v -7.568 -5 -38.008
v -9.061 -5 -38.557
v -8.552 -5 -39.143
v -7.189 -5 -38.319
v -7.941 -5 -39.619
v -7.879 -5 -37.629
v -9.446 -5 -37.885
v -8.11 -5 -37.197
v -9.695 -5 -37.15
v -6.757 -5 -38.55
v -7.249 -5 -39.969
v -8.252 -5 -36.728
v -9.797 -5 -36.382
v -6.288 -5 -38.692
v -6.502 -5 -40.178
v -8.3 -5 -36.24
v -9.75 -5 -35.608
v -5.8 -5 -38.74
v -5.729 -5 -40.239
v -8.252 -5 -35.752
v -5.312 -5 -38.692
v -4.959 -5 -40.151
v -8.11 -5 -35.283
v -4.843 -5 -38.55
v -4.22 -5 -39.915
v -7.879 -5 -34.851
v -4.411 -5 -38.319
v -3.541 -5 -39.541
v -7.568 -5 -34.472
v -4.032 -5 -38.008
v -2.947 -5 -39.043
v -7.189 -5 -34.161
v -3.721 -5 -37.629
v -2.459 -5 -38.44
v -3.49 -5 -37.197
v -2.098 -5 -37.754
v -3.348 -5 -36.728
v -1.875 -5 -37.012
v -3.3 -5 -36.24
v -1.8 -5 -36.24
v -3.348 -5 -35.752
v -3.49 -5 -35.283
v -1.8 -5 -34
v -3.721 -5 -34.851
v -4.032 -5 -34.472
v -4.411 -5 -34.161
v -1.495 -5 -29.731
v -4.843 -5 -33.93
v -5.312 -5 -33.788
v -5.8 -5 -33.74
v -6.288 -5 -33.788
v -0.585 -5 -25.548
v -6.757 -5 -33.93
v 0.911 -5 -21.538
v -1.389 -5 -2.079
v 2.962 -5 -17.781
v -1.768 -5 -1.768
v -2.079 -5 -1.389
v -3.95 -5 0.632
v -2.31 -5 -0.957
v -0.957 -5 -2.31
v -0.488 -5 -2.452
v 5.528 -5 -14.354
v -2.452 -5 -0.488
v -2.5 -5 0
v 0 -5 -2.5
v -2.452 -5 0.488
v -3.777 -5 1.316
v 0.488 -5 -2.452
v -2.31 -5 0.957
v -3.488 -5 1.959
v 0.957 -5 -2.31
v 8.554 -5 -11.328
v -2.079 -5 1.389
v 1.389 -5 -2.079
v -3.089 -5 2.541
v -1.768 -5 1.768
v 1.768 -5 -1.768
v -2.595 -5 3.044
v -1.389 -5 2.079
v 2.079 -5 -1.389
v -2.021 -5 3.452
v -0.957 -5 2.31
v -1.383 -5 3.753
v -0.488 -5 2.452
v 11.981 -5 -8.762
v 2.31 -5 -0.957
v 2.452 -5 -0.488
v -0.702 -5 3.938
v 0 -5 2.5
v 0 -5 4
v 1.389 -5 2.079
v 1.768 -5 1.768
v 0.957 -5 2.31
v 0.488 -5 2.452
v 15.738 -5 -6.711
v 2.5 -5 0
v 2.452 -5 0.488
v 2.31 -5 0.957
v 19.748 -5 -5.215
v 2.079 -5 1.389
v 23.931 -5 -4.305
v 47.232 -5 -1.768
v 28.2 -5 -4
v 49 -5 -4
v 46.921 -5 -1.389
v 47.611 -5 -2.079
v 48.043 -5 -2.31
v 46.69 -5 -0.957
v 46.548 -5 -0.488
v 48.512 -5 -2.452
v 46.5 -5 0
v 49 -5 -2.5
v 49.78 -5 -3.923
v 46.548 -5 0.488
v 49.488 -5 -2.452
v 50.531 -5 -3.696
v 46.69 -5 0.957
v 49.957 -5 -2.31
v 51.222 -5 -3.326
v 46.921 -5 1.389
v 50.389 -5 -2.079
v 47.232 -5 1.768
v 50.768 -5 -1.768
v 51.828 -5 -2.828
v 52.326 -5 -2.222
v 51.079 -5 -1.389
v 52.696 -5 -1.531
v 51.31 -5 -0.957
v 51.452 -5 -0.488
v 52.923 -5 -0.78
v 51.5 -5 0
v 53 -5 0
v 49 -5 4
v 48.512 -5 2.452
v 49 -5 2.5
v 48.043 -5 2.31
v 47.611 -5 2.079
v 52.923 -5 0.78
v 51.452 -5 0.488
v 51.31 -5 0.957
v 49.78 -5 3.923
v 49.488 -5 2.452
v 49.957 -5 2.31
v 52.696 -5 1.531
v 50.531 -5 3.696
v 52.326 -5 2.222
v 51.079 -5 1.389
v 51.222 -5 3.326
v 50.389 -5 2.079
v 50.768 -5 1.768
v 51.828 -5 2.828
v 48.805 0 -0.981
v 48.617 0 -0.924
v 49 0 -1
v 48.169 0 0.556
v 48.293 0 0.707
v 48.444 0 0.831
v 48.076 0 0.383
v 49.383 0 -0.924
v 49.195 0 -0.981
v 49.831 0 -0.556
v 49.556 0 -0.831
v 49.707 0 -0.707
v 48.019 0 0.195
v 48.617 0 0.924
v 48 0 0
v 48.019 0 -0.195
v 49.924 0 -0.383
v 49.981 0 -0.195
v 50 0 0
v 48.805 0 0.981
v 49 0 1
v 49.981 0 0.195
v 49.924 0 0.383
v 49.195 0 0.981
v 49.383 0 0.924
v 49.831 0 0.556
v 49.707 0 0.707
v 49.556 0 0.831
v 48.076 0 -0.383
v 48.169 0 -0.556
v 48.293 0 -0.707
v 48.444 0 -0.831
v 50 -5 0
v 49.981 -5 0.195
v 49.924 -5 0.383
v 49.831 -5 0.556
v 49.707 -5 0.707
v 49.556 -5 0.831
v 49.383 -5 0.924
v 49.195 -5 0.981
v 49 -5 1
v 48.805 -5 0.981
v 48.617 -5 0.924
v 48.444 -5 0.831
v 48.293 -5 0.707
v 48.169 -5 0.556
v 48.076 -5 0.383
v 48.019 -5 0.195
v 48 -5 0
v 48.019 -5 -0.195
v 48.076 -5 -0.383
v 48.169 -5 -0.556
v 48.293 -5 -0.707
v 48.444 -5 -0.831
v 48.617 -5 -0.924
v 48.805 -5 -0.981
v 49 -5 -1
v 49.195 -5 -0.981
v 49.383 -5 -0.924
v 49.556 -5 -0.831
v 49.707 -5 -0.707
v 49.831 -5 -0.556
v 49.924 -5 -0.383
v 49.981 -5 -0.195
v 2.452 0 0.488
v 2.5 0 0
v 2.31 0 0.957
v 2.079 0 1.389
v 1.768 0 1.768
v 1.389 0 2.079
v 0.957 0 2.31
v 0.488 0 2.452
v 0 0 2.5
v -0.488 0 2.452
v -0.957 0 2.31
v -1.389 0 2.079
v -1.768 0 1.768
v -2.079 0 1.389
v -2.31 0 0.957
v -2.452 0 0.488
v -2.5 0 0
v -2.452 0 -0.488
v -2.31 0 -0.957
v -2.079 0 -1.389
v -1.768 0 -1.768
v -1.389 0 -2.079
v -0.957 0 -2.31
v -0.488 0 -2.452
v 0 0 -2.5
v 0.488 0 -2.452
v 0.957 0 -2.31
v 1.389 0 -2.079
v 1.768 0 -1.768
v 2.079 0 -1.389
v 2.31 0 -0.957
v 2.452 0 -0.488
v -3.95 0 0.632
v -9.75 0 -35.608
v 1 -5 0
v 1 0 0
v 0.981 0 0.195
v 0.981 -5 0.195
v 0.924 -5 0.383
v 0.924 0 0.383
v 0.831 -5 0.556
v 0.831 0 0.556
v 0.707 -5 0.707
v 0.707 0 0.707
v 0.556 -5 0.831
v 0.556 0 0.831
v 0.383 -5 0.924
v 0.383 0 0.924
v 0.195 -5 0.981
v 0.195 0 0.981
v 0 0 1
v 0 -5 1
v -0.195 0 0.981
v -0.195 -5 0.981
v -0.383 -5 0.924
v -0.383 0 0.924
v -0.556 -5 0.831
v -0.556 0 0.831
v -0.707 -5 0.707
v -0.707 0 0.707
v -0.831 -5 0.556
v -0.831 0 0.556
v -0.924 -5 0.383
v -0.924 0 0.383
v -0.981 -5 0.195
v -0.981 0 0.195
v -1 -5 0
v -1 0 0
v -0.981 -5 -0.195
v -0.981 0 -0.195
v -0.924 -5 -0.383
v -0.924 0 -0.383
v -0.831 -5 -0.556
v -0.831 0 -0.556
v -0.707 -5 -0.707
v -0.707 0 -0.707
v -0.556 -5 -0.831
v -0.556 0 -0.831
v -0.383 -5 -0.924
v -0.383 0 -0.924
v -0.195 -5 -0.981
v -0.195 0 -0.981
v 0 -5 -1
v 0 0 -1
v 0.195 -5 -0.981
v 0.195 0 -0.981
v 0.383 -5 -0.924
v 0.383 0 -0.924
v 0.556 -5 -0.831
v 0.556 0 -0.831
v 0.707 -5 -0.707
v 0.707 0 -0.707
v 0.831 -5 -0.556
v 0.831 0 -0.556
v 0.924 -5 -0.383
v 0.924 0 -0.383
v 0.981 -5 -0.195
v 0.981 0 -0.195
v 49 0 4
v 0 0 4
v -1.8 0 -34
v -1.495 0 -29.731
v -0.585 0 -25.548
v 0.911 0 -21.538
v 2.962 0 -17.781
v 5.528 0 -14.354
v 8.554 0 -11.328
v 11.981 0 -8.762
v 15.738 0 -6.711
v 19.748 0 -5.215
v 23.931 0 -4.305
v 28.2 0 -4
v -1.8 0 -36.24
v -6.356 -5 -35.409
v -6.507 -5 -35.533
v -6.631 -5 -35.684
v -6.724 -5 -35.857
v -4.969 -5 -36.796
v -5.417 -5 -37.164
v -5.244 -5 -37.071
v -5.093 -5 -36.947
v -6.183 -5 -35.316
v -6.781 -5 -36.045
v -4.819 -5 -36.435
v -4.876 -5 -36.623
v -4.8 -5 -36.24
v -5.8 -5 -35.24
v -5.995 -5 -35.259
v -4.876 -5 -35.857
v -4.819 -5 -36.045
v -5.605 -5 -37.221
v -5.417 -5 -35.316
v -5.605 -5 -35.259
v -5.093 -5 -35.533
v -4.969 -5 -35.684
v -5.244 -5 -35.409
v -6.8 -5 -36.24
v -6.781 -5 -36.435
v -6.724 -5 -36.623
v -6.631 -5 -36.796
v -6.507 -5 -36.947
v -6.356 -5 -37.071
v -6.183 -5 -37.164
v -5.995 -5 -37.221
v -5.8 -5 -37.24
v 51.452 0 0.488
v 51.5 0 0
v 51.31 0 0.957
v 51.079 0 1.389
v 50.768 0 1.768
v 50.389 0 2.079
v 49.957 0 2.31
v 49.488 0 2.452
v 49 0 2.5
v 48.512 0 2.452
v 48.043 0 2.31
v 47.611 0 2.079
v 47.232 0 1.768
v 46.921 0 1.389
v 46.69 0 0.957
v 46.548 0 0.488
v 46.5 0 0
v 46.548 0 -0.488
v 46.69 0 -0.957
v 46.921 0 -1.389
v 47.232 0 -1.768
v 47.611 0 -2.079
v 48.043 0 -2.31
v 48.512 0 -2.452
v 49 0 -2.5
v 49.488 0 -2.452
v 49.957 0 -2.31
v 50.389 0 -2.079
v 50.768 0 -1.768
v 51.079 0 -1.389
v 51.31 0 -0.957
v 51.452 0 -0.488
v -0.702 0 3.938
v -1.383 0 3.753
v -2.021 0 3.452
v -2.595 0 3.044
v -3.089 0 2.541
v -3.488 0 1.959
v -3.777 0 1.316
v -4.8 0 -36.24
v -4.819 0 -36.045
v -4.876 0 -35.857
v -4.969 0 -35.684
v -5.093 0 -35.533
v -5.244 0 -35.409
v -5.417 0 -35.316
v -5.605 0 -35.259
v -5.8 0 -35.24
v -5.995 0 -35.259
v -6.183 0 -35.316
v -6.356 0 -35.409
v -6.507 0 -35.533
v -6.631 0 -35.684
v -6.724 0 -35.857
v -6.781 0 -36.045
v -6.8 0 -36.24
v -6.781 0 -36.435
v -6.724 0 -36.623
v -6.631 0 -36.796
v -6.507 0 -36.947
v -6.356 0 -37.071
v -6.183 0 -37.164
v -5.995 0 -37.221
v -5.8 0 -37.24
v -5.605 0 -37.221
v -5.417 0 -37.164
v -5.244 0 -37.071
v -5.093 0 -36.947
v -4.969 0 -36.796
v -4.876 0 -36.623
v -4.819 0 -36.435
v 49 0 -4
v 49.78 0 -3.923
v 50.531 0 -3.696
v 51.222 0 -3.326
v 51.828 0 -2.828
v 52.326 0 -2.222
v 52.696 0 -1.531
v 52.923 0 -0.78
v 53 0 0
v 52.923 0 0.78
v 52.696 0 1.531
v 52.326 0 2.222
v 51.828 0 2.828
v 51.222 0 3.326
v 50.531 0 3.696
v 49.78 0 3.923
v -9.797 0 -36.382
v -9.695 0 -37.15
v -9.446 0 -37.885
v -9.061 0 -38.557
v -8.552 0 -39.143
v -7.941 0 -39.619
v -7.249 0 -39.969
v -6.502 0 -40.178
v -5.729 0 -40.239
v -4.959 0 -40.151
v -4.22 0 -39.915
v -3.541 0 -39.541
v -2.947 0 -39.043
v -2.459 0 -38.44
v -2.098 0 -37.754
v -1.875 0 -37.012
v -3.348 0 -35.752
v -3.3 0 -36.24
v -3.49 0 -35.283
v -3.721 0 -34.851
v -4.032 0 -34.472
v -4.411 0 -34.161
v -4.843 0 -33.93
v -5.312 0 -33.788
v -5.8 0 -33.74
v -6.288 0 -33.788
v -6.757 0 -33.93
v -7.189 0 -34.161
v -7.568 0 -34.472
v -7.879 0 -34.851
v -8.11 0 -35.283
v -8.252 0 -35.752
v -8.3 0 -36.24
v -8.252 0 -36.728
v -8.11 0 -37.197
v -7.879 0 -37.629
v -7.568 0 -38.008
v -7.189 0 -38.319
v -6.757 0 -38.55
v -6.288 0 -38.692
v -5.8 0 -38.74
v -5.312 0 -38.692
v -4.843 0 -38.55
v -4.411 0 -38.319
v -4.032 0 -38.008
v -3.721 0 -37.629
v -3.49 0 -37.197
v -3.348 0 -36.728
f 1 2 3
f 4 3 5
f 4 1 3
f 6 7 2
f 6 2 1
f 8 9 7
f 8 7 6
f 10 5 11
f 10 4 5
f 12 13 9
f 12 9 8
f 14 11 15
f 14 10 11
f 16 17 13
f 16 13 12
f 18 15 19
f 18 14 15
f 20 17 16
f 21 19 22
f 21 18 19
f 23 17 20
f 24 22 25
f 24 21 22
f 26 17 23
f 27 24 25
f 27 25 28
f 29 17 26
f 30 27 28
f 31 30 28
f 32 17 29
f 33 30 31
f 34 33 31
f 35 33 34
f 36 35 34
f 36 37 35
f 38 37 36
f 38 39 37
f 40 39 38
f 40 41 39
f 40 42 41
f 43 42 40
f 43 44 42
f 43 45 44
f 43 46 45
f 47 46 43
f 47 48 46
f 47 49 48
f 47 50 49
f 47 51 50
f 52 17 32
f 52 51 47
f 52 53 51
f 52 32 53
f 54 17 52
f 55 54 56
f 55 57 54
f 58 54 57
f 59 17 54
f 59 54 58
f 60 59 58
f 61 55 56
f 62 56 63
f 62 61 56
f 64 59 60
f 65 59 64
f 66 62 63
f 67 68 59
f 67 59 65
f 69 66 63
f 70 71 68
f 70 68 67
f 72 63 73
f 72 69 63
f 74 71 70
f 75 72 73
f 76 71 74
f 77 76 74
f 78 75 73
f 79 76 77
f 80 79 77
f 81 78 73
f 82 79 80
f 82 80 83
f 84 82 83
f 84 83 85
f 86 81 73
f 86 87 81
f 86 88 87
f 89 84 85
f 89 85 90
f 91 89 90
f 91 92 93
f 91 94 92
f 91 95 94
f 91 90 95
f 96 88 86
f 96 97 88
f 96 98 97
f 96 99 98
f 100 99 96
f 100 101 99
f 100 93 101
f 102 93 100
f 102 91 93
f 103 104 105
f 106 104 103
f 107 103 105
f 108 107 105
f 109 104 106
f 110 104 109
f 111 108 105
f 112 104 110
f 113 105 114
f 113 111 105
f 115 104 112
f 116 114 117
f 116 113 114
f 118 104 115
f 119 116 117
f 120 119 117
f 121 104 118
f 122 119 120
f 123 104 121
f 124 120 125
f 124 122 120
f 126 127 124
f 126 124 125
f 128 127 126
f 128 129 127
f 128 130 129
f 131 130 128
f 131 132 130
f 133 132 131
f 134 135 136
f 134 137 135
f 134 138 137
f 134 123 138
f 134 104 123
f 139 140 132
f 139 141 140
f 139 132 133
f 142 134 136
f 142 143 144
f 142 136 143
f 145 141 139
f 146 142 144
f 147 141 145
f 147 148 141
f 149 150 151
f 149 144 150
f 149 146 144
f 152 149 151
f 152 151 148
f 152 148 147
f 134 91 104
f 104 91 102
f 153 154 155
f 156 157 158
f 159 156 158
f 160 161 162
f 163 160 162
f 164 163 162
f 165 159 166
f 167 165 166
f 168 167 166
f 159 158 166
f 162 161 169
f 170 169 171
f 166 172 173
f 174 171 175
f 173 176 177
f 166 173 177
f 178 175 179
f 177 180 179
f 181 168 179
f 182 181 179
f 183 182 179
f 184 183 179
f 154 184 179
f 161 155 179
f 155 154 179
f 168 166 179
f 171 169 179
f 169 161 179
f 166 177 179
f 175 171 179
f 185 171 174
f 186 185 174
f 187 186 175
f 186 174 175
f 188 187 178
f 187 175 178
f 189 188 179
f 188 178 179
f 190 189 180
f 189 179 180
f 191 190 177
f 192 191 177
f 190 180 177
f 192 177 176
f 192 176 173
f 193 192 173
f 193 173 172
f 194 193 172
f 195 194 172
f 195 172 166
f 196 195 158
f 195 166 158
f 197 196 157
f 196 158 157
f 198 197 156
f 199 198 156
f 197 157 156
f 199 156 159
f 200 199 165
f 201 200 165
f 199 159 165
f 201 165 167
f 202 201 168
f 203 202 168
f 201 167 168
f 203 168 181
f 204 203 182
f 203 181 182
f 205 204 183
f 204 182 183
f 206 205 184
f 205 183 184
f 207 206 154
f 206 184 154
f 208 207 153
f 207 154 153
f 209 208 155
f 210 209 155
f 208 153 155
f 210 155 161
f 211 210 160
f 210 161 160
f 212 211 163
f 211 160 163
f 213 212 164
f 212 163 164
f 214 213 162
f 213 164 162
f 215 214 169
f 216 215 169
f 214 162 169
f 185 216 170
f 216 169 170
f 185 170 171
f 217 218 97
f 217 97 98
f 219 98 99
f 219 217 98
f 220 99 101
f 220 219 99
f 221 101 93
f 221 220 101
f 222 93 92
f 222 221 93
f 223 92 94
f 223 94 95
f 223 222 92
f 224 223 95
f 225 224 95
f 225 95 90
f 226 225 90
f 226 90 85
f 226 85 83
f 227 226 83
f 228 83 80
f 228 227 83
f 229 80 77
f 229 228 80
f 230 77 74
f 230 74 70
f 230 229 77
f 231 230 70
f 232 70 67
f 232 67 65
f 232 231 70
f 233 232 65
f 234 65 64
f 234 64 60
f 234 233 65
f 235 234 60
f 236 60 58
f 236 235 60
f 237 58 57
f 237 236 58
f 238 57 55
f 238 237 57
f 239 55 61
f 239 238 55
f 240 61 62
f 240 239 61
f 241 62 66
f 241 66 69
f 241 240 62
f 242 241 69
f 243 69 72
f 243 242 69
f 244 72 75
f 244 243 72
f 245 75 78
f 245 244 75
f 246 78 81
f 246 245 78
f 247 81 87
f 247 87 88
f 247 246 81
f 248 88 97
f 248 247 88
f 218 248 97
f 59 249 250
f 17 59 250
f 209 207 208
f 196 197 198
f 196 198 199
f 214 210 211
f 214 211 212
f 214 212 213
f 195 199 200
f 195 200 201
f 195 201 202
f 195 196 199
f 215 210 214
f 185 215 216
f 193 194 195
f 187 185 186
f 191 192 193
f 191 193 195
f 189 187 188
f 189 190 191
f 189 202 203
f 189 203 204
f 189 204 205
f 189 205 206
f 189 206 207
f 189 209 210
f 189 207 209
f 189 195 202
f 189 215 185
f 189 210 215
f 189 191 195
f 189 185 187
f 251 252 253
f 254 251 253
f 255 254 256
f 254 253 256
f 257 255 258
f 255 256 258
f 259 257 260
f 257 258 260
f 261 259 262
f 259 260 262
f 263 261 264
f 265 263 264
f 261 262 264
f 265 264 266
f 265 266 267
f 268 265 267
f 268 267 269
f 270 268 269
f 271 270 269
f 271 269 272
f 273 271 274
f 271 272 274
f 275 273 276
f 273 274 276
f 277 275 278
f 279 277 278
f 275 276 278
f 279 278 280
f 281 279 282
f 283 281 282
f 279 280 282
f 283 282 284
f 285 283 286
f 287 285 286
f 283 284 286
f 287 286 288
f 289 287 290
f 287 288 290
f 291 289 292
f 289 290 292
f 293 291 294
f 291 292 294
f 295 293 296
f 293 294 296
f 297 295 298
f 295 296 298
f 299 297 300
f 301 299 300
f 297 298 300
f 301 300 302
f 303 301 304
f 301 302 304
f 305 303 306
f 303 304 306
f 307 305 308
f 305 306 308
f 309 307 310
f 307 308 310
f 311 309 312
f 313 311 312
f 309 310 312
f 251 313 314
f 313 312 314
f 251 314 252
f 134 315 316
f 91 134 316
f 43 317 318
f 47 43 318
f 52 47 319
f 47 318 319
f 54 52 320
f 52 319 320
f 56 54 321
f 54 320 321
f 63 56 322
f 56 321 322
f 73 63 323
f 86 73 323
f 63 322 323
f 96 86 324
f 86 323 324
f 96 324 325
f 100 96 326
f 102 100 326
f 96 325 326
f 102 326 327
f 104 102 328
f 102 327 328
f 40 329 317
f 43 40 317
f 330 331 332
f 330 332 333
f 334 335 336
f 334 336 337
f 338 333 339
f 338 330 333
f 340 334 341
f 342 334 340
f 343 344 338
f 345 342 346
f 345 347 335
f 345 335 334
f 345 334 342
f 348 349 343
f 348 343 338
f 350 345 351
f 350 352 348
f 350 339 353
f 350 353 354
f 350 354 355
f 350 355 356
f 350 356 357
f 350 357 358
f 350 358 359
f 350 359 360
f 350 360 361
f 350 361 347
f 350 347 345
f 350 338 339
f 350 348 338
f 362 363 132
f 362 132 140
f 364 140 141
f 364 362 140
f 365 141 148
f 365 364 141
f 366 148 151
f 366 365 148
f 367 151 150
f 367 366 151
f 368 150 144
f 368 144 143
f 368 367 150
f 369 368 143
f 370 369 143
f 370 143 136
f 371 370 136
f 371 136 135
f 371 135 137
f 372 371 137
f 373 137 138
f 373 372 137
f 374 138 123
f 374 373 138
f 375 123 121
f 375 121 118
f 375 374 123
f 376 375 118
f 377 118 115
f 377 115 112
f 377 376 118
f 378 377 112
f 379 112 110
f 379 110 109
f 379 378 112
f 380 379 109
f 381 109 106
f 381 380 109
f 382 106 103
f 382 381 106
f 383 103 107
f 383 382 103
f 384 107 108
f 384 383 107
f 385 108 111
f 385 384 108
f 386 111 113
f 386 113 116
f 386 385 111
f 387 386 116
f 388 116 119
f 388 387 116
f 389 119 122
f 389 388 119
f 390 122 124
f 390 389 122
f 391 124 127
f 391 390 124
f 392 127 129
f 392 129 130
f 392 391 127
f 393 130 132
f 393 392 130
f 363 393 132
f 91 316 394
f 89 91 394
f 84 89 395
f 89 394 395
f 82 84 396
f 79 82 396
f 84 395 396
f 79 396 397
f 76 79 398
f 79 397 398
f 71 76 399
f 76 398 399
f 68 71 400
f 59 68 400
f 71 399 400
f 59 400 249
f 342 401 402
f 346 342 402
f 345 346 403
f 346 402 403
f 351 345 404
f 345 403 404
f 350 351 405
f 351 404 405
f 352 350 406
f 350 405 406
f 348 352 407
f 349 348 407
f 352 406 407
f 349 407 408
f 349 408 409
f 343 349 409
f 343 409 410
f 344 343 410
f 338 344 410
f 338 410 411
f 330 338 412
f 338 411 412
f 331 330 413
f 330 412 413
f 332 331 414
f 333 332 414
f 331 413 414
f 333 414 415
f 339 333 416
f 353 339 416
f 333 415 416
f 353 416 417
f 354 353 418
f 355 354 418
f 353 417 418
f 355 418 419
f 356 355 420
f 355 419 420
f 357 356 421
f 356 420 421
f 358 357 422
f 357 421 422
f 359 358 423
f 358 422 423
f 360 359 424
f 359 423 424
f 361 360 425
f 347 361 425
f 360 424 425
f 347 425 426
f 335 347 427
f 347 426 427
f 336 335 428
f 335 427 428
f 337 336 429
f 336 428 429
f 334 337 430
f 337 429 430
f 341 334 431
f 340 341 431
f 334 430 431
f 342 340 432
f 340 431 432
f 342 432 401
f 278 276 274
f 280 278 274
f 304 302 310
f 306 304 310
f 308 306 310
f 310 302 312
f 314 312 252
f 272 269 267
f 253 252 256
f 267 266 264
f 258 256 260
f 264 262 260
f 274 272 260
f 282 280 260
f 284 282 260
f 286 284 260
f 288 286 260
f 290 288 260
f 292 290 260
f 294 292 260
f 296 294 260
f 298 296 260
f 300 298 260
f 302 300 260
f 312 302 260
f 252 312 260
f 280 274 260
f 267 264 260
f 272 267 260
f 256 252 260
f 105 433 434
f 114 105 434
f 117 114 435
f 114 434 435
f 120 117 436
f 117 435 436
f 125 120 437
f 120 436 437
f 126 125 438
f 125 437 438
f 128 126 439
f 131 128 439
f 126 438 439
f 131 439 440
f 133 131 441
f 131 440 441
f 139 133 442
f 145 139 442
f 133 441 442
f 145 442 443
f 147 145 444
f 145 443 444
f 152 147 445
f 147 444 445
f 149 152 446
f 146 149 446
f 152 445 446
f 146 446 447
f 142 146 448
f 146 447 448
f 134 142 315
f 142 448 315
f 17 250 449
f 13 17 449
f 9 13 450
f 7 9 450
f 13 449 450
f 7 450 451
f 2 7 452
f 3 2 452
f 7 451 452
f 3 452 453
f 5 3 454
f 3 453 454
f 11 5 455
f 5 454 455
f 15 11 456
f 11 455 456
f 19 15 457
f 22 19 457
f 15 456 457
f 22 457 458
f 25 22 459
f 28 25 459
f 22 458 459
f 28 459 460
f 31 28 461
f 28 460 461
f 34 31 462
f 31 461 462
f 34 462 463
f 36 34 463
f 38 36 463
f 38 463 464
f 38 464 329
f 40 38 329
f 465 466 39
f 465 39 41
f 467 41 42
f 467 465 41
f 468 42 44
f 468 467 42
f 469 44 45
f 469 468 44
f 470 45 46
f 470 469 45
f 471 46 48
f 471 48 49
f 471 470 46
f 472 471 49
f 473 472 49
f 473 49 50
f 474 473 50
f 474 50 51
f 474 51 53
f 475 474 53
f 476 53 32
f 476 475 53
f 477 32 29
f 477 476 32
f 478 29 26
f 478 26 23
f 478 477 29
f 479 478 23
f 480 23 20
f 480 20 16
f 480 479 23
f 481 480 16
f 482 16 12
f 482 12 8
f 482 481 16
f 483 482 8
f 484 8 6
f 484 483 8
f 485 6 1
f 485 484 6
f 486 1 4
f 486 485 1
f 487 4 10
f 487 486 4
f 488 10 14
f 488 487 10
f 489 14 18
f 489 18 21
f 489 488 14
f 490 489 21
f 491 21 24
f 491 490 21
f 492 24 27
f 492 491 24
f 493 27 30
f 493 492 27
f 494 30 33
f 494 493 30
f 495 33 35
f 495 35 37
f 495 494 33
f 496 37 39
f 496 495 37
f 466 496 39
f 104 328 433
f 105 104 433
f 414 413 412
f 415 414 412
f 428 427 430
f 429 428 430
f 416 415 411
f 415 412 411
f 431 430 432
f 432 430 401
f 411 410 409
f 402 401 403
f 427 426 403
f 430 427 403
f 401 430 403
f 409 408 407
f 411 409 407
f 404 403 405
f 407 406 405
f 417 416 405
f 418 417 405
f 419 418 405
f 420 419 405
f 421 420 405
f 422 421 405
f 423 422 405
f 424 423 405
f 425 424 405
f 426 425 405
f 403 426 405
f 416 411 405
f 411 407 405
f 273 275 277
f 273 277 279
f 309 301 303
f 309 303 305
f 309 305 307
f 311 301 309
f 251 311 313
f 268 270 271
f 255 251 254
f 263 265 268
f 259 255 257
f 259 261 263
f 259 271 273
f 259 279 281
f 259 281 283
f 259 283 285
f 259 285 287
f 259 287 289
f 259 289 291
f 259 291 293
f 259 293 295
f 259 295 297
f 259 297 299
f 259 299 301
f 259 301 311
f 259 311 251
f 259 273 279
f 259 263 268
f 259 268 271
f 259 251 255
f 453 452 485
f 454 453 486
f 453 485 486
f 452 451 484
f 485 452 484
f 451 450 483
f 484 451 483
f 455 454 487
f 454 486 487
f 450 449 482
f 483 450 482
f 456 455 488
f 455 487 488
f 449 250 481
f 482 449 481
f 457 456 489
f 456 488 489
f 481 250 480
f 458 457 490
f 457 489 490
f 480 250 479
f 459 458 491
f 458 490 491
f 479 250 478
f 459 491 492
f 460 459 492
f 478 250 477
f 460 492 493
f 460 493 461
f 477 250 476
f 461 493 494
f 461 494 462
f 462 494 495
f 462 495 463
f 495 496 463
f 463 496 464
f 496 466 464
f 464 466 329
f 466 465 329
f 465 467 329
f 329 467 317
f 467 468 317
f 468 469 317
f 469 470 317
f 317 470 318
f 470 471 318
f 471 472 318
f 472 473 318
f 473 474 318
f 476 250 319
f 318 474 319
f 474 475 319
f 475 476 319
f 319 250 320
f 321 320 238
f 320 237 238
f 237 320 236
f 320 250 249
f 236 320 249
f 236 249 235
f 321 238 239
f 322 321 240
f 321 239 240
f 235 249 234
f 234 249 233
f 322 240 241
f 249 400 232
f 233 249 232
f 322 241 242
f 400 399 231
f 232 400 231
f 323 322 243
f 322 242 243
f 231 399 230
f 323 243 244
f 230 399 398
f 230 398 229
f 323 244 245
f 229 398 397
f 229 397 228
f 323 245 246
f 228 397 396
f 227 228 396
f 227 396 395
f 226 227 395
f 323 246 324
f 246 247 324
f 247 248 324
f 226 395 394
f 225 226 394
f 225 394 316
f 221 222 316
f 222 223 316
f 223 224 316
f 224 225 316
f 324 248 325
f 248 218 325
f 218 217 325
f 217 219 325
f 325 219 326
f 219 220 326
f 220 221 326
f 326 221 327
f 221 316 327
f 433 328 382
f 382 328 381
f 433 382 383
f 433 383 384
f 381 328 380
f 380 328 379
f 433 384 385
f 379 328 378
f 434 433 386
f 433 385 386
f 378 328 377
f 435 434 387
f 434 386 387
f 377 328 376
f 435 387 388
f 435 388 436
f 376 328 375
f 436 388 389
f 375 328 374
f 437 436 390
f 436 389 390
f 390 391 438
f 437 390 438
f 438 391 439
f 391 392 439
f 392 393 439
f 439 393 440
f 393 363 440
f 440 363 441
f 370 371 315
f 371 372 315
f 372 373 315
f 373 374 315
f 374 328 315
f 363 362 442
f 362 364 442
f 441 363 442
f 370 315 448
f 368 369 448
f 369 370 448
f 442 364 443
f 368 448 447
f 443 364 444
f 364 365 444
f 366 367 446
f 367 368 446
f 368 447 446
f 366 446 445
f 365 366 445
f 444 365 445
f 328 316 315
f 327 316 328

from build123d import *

# Parameters (mm, degrees)
F0_R     = 2.5
F0_R_2   = 1
F1_DEPTH = 5


with BuildPart() as f1:
    # F0 (on Front) → F1 (new body)
    with BuildSketch(Plane.XZ):
        with BuildLine():
            Line((49, 4), (0, 4))
            ThreePointArc((0, 4), (-2.59533, 3.043725), (-3.949735, 0.632132))
            Line((-3.949735, 0.632132), (-9.749735, -35.607868))
            ThreePointArc((-9.749735, -35.607868), (-5.482936, -32.252586), (-1.8, -36.24))
            Line((-1.8, -36.24), (-1.8, -34))
            ThreePointArc((-1.8, -34), (6.986797, -12.786797), (28.2, -4))
            Line((28.2, -4), (49, -4))
            ThreePointArc((49, -4), (53, 0), (49, 4))
        make_face()
        Circle(F0_R, mode=Mode.SUBTRACT)
        with Locations((49, 0)):
            Circle(F0_R, mode=Mode.SUBTRACT)
        with BuildLine():
            ThreePointArc((-1.8, -36.24), (-5.482936, -32.252586), (-9.749735, -35.607868))
            ThreePointArc((-9.749735, -35.607868), (-6.117064, -40.227414), (-1.8, -36.24))
        make_face()
        with Locations((-5.8, -36.24)):
            Circle(F0_R, mode=Mode.SUBTRACT)
        with Locations((-5.8, -36.24)):
            Circle(F0_R_2)
        Circle(F0_R_2)
        with Locations((49, 0)):
            Circle(F0_R_2)
    extrude(amount=F1_DEPTH)


solid = f1.part
